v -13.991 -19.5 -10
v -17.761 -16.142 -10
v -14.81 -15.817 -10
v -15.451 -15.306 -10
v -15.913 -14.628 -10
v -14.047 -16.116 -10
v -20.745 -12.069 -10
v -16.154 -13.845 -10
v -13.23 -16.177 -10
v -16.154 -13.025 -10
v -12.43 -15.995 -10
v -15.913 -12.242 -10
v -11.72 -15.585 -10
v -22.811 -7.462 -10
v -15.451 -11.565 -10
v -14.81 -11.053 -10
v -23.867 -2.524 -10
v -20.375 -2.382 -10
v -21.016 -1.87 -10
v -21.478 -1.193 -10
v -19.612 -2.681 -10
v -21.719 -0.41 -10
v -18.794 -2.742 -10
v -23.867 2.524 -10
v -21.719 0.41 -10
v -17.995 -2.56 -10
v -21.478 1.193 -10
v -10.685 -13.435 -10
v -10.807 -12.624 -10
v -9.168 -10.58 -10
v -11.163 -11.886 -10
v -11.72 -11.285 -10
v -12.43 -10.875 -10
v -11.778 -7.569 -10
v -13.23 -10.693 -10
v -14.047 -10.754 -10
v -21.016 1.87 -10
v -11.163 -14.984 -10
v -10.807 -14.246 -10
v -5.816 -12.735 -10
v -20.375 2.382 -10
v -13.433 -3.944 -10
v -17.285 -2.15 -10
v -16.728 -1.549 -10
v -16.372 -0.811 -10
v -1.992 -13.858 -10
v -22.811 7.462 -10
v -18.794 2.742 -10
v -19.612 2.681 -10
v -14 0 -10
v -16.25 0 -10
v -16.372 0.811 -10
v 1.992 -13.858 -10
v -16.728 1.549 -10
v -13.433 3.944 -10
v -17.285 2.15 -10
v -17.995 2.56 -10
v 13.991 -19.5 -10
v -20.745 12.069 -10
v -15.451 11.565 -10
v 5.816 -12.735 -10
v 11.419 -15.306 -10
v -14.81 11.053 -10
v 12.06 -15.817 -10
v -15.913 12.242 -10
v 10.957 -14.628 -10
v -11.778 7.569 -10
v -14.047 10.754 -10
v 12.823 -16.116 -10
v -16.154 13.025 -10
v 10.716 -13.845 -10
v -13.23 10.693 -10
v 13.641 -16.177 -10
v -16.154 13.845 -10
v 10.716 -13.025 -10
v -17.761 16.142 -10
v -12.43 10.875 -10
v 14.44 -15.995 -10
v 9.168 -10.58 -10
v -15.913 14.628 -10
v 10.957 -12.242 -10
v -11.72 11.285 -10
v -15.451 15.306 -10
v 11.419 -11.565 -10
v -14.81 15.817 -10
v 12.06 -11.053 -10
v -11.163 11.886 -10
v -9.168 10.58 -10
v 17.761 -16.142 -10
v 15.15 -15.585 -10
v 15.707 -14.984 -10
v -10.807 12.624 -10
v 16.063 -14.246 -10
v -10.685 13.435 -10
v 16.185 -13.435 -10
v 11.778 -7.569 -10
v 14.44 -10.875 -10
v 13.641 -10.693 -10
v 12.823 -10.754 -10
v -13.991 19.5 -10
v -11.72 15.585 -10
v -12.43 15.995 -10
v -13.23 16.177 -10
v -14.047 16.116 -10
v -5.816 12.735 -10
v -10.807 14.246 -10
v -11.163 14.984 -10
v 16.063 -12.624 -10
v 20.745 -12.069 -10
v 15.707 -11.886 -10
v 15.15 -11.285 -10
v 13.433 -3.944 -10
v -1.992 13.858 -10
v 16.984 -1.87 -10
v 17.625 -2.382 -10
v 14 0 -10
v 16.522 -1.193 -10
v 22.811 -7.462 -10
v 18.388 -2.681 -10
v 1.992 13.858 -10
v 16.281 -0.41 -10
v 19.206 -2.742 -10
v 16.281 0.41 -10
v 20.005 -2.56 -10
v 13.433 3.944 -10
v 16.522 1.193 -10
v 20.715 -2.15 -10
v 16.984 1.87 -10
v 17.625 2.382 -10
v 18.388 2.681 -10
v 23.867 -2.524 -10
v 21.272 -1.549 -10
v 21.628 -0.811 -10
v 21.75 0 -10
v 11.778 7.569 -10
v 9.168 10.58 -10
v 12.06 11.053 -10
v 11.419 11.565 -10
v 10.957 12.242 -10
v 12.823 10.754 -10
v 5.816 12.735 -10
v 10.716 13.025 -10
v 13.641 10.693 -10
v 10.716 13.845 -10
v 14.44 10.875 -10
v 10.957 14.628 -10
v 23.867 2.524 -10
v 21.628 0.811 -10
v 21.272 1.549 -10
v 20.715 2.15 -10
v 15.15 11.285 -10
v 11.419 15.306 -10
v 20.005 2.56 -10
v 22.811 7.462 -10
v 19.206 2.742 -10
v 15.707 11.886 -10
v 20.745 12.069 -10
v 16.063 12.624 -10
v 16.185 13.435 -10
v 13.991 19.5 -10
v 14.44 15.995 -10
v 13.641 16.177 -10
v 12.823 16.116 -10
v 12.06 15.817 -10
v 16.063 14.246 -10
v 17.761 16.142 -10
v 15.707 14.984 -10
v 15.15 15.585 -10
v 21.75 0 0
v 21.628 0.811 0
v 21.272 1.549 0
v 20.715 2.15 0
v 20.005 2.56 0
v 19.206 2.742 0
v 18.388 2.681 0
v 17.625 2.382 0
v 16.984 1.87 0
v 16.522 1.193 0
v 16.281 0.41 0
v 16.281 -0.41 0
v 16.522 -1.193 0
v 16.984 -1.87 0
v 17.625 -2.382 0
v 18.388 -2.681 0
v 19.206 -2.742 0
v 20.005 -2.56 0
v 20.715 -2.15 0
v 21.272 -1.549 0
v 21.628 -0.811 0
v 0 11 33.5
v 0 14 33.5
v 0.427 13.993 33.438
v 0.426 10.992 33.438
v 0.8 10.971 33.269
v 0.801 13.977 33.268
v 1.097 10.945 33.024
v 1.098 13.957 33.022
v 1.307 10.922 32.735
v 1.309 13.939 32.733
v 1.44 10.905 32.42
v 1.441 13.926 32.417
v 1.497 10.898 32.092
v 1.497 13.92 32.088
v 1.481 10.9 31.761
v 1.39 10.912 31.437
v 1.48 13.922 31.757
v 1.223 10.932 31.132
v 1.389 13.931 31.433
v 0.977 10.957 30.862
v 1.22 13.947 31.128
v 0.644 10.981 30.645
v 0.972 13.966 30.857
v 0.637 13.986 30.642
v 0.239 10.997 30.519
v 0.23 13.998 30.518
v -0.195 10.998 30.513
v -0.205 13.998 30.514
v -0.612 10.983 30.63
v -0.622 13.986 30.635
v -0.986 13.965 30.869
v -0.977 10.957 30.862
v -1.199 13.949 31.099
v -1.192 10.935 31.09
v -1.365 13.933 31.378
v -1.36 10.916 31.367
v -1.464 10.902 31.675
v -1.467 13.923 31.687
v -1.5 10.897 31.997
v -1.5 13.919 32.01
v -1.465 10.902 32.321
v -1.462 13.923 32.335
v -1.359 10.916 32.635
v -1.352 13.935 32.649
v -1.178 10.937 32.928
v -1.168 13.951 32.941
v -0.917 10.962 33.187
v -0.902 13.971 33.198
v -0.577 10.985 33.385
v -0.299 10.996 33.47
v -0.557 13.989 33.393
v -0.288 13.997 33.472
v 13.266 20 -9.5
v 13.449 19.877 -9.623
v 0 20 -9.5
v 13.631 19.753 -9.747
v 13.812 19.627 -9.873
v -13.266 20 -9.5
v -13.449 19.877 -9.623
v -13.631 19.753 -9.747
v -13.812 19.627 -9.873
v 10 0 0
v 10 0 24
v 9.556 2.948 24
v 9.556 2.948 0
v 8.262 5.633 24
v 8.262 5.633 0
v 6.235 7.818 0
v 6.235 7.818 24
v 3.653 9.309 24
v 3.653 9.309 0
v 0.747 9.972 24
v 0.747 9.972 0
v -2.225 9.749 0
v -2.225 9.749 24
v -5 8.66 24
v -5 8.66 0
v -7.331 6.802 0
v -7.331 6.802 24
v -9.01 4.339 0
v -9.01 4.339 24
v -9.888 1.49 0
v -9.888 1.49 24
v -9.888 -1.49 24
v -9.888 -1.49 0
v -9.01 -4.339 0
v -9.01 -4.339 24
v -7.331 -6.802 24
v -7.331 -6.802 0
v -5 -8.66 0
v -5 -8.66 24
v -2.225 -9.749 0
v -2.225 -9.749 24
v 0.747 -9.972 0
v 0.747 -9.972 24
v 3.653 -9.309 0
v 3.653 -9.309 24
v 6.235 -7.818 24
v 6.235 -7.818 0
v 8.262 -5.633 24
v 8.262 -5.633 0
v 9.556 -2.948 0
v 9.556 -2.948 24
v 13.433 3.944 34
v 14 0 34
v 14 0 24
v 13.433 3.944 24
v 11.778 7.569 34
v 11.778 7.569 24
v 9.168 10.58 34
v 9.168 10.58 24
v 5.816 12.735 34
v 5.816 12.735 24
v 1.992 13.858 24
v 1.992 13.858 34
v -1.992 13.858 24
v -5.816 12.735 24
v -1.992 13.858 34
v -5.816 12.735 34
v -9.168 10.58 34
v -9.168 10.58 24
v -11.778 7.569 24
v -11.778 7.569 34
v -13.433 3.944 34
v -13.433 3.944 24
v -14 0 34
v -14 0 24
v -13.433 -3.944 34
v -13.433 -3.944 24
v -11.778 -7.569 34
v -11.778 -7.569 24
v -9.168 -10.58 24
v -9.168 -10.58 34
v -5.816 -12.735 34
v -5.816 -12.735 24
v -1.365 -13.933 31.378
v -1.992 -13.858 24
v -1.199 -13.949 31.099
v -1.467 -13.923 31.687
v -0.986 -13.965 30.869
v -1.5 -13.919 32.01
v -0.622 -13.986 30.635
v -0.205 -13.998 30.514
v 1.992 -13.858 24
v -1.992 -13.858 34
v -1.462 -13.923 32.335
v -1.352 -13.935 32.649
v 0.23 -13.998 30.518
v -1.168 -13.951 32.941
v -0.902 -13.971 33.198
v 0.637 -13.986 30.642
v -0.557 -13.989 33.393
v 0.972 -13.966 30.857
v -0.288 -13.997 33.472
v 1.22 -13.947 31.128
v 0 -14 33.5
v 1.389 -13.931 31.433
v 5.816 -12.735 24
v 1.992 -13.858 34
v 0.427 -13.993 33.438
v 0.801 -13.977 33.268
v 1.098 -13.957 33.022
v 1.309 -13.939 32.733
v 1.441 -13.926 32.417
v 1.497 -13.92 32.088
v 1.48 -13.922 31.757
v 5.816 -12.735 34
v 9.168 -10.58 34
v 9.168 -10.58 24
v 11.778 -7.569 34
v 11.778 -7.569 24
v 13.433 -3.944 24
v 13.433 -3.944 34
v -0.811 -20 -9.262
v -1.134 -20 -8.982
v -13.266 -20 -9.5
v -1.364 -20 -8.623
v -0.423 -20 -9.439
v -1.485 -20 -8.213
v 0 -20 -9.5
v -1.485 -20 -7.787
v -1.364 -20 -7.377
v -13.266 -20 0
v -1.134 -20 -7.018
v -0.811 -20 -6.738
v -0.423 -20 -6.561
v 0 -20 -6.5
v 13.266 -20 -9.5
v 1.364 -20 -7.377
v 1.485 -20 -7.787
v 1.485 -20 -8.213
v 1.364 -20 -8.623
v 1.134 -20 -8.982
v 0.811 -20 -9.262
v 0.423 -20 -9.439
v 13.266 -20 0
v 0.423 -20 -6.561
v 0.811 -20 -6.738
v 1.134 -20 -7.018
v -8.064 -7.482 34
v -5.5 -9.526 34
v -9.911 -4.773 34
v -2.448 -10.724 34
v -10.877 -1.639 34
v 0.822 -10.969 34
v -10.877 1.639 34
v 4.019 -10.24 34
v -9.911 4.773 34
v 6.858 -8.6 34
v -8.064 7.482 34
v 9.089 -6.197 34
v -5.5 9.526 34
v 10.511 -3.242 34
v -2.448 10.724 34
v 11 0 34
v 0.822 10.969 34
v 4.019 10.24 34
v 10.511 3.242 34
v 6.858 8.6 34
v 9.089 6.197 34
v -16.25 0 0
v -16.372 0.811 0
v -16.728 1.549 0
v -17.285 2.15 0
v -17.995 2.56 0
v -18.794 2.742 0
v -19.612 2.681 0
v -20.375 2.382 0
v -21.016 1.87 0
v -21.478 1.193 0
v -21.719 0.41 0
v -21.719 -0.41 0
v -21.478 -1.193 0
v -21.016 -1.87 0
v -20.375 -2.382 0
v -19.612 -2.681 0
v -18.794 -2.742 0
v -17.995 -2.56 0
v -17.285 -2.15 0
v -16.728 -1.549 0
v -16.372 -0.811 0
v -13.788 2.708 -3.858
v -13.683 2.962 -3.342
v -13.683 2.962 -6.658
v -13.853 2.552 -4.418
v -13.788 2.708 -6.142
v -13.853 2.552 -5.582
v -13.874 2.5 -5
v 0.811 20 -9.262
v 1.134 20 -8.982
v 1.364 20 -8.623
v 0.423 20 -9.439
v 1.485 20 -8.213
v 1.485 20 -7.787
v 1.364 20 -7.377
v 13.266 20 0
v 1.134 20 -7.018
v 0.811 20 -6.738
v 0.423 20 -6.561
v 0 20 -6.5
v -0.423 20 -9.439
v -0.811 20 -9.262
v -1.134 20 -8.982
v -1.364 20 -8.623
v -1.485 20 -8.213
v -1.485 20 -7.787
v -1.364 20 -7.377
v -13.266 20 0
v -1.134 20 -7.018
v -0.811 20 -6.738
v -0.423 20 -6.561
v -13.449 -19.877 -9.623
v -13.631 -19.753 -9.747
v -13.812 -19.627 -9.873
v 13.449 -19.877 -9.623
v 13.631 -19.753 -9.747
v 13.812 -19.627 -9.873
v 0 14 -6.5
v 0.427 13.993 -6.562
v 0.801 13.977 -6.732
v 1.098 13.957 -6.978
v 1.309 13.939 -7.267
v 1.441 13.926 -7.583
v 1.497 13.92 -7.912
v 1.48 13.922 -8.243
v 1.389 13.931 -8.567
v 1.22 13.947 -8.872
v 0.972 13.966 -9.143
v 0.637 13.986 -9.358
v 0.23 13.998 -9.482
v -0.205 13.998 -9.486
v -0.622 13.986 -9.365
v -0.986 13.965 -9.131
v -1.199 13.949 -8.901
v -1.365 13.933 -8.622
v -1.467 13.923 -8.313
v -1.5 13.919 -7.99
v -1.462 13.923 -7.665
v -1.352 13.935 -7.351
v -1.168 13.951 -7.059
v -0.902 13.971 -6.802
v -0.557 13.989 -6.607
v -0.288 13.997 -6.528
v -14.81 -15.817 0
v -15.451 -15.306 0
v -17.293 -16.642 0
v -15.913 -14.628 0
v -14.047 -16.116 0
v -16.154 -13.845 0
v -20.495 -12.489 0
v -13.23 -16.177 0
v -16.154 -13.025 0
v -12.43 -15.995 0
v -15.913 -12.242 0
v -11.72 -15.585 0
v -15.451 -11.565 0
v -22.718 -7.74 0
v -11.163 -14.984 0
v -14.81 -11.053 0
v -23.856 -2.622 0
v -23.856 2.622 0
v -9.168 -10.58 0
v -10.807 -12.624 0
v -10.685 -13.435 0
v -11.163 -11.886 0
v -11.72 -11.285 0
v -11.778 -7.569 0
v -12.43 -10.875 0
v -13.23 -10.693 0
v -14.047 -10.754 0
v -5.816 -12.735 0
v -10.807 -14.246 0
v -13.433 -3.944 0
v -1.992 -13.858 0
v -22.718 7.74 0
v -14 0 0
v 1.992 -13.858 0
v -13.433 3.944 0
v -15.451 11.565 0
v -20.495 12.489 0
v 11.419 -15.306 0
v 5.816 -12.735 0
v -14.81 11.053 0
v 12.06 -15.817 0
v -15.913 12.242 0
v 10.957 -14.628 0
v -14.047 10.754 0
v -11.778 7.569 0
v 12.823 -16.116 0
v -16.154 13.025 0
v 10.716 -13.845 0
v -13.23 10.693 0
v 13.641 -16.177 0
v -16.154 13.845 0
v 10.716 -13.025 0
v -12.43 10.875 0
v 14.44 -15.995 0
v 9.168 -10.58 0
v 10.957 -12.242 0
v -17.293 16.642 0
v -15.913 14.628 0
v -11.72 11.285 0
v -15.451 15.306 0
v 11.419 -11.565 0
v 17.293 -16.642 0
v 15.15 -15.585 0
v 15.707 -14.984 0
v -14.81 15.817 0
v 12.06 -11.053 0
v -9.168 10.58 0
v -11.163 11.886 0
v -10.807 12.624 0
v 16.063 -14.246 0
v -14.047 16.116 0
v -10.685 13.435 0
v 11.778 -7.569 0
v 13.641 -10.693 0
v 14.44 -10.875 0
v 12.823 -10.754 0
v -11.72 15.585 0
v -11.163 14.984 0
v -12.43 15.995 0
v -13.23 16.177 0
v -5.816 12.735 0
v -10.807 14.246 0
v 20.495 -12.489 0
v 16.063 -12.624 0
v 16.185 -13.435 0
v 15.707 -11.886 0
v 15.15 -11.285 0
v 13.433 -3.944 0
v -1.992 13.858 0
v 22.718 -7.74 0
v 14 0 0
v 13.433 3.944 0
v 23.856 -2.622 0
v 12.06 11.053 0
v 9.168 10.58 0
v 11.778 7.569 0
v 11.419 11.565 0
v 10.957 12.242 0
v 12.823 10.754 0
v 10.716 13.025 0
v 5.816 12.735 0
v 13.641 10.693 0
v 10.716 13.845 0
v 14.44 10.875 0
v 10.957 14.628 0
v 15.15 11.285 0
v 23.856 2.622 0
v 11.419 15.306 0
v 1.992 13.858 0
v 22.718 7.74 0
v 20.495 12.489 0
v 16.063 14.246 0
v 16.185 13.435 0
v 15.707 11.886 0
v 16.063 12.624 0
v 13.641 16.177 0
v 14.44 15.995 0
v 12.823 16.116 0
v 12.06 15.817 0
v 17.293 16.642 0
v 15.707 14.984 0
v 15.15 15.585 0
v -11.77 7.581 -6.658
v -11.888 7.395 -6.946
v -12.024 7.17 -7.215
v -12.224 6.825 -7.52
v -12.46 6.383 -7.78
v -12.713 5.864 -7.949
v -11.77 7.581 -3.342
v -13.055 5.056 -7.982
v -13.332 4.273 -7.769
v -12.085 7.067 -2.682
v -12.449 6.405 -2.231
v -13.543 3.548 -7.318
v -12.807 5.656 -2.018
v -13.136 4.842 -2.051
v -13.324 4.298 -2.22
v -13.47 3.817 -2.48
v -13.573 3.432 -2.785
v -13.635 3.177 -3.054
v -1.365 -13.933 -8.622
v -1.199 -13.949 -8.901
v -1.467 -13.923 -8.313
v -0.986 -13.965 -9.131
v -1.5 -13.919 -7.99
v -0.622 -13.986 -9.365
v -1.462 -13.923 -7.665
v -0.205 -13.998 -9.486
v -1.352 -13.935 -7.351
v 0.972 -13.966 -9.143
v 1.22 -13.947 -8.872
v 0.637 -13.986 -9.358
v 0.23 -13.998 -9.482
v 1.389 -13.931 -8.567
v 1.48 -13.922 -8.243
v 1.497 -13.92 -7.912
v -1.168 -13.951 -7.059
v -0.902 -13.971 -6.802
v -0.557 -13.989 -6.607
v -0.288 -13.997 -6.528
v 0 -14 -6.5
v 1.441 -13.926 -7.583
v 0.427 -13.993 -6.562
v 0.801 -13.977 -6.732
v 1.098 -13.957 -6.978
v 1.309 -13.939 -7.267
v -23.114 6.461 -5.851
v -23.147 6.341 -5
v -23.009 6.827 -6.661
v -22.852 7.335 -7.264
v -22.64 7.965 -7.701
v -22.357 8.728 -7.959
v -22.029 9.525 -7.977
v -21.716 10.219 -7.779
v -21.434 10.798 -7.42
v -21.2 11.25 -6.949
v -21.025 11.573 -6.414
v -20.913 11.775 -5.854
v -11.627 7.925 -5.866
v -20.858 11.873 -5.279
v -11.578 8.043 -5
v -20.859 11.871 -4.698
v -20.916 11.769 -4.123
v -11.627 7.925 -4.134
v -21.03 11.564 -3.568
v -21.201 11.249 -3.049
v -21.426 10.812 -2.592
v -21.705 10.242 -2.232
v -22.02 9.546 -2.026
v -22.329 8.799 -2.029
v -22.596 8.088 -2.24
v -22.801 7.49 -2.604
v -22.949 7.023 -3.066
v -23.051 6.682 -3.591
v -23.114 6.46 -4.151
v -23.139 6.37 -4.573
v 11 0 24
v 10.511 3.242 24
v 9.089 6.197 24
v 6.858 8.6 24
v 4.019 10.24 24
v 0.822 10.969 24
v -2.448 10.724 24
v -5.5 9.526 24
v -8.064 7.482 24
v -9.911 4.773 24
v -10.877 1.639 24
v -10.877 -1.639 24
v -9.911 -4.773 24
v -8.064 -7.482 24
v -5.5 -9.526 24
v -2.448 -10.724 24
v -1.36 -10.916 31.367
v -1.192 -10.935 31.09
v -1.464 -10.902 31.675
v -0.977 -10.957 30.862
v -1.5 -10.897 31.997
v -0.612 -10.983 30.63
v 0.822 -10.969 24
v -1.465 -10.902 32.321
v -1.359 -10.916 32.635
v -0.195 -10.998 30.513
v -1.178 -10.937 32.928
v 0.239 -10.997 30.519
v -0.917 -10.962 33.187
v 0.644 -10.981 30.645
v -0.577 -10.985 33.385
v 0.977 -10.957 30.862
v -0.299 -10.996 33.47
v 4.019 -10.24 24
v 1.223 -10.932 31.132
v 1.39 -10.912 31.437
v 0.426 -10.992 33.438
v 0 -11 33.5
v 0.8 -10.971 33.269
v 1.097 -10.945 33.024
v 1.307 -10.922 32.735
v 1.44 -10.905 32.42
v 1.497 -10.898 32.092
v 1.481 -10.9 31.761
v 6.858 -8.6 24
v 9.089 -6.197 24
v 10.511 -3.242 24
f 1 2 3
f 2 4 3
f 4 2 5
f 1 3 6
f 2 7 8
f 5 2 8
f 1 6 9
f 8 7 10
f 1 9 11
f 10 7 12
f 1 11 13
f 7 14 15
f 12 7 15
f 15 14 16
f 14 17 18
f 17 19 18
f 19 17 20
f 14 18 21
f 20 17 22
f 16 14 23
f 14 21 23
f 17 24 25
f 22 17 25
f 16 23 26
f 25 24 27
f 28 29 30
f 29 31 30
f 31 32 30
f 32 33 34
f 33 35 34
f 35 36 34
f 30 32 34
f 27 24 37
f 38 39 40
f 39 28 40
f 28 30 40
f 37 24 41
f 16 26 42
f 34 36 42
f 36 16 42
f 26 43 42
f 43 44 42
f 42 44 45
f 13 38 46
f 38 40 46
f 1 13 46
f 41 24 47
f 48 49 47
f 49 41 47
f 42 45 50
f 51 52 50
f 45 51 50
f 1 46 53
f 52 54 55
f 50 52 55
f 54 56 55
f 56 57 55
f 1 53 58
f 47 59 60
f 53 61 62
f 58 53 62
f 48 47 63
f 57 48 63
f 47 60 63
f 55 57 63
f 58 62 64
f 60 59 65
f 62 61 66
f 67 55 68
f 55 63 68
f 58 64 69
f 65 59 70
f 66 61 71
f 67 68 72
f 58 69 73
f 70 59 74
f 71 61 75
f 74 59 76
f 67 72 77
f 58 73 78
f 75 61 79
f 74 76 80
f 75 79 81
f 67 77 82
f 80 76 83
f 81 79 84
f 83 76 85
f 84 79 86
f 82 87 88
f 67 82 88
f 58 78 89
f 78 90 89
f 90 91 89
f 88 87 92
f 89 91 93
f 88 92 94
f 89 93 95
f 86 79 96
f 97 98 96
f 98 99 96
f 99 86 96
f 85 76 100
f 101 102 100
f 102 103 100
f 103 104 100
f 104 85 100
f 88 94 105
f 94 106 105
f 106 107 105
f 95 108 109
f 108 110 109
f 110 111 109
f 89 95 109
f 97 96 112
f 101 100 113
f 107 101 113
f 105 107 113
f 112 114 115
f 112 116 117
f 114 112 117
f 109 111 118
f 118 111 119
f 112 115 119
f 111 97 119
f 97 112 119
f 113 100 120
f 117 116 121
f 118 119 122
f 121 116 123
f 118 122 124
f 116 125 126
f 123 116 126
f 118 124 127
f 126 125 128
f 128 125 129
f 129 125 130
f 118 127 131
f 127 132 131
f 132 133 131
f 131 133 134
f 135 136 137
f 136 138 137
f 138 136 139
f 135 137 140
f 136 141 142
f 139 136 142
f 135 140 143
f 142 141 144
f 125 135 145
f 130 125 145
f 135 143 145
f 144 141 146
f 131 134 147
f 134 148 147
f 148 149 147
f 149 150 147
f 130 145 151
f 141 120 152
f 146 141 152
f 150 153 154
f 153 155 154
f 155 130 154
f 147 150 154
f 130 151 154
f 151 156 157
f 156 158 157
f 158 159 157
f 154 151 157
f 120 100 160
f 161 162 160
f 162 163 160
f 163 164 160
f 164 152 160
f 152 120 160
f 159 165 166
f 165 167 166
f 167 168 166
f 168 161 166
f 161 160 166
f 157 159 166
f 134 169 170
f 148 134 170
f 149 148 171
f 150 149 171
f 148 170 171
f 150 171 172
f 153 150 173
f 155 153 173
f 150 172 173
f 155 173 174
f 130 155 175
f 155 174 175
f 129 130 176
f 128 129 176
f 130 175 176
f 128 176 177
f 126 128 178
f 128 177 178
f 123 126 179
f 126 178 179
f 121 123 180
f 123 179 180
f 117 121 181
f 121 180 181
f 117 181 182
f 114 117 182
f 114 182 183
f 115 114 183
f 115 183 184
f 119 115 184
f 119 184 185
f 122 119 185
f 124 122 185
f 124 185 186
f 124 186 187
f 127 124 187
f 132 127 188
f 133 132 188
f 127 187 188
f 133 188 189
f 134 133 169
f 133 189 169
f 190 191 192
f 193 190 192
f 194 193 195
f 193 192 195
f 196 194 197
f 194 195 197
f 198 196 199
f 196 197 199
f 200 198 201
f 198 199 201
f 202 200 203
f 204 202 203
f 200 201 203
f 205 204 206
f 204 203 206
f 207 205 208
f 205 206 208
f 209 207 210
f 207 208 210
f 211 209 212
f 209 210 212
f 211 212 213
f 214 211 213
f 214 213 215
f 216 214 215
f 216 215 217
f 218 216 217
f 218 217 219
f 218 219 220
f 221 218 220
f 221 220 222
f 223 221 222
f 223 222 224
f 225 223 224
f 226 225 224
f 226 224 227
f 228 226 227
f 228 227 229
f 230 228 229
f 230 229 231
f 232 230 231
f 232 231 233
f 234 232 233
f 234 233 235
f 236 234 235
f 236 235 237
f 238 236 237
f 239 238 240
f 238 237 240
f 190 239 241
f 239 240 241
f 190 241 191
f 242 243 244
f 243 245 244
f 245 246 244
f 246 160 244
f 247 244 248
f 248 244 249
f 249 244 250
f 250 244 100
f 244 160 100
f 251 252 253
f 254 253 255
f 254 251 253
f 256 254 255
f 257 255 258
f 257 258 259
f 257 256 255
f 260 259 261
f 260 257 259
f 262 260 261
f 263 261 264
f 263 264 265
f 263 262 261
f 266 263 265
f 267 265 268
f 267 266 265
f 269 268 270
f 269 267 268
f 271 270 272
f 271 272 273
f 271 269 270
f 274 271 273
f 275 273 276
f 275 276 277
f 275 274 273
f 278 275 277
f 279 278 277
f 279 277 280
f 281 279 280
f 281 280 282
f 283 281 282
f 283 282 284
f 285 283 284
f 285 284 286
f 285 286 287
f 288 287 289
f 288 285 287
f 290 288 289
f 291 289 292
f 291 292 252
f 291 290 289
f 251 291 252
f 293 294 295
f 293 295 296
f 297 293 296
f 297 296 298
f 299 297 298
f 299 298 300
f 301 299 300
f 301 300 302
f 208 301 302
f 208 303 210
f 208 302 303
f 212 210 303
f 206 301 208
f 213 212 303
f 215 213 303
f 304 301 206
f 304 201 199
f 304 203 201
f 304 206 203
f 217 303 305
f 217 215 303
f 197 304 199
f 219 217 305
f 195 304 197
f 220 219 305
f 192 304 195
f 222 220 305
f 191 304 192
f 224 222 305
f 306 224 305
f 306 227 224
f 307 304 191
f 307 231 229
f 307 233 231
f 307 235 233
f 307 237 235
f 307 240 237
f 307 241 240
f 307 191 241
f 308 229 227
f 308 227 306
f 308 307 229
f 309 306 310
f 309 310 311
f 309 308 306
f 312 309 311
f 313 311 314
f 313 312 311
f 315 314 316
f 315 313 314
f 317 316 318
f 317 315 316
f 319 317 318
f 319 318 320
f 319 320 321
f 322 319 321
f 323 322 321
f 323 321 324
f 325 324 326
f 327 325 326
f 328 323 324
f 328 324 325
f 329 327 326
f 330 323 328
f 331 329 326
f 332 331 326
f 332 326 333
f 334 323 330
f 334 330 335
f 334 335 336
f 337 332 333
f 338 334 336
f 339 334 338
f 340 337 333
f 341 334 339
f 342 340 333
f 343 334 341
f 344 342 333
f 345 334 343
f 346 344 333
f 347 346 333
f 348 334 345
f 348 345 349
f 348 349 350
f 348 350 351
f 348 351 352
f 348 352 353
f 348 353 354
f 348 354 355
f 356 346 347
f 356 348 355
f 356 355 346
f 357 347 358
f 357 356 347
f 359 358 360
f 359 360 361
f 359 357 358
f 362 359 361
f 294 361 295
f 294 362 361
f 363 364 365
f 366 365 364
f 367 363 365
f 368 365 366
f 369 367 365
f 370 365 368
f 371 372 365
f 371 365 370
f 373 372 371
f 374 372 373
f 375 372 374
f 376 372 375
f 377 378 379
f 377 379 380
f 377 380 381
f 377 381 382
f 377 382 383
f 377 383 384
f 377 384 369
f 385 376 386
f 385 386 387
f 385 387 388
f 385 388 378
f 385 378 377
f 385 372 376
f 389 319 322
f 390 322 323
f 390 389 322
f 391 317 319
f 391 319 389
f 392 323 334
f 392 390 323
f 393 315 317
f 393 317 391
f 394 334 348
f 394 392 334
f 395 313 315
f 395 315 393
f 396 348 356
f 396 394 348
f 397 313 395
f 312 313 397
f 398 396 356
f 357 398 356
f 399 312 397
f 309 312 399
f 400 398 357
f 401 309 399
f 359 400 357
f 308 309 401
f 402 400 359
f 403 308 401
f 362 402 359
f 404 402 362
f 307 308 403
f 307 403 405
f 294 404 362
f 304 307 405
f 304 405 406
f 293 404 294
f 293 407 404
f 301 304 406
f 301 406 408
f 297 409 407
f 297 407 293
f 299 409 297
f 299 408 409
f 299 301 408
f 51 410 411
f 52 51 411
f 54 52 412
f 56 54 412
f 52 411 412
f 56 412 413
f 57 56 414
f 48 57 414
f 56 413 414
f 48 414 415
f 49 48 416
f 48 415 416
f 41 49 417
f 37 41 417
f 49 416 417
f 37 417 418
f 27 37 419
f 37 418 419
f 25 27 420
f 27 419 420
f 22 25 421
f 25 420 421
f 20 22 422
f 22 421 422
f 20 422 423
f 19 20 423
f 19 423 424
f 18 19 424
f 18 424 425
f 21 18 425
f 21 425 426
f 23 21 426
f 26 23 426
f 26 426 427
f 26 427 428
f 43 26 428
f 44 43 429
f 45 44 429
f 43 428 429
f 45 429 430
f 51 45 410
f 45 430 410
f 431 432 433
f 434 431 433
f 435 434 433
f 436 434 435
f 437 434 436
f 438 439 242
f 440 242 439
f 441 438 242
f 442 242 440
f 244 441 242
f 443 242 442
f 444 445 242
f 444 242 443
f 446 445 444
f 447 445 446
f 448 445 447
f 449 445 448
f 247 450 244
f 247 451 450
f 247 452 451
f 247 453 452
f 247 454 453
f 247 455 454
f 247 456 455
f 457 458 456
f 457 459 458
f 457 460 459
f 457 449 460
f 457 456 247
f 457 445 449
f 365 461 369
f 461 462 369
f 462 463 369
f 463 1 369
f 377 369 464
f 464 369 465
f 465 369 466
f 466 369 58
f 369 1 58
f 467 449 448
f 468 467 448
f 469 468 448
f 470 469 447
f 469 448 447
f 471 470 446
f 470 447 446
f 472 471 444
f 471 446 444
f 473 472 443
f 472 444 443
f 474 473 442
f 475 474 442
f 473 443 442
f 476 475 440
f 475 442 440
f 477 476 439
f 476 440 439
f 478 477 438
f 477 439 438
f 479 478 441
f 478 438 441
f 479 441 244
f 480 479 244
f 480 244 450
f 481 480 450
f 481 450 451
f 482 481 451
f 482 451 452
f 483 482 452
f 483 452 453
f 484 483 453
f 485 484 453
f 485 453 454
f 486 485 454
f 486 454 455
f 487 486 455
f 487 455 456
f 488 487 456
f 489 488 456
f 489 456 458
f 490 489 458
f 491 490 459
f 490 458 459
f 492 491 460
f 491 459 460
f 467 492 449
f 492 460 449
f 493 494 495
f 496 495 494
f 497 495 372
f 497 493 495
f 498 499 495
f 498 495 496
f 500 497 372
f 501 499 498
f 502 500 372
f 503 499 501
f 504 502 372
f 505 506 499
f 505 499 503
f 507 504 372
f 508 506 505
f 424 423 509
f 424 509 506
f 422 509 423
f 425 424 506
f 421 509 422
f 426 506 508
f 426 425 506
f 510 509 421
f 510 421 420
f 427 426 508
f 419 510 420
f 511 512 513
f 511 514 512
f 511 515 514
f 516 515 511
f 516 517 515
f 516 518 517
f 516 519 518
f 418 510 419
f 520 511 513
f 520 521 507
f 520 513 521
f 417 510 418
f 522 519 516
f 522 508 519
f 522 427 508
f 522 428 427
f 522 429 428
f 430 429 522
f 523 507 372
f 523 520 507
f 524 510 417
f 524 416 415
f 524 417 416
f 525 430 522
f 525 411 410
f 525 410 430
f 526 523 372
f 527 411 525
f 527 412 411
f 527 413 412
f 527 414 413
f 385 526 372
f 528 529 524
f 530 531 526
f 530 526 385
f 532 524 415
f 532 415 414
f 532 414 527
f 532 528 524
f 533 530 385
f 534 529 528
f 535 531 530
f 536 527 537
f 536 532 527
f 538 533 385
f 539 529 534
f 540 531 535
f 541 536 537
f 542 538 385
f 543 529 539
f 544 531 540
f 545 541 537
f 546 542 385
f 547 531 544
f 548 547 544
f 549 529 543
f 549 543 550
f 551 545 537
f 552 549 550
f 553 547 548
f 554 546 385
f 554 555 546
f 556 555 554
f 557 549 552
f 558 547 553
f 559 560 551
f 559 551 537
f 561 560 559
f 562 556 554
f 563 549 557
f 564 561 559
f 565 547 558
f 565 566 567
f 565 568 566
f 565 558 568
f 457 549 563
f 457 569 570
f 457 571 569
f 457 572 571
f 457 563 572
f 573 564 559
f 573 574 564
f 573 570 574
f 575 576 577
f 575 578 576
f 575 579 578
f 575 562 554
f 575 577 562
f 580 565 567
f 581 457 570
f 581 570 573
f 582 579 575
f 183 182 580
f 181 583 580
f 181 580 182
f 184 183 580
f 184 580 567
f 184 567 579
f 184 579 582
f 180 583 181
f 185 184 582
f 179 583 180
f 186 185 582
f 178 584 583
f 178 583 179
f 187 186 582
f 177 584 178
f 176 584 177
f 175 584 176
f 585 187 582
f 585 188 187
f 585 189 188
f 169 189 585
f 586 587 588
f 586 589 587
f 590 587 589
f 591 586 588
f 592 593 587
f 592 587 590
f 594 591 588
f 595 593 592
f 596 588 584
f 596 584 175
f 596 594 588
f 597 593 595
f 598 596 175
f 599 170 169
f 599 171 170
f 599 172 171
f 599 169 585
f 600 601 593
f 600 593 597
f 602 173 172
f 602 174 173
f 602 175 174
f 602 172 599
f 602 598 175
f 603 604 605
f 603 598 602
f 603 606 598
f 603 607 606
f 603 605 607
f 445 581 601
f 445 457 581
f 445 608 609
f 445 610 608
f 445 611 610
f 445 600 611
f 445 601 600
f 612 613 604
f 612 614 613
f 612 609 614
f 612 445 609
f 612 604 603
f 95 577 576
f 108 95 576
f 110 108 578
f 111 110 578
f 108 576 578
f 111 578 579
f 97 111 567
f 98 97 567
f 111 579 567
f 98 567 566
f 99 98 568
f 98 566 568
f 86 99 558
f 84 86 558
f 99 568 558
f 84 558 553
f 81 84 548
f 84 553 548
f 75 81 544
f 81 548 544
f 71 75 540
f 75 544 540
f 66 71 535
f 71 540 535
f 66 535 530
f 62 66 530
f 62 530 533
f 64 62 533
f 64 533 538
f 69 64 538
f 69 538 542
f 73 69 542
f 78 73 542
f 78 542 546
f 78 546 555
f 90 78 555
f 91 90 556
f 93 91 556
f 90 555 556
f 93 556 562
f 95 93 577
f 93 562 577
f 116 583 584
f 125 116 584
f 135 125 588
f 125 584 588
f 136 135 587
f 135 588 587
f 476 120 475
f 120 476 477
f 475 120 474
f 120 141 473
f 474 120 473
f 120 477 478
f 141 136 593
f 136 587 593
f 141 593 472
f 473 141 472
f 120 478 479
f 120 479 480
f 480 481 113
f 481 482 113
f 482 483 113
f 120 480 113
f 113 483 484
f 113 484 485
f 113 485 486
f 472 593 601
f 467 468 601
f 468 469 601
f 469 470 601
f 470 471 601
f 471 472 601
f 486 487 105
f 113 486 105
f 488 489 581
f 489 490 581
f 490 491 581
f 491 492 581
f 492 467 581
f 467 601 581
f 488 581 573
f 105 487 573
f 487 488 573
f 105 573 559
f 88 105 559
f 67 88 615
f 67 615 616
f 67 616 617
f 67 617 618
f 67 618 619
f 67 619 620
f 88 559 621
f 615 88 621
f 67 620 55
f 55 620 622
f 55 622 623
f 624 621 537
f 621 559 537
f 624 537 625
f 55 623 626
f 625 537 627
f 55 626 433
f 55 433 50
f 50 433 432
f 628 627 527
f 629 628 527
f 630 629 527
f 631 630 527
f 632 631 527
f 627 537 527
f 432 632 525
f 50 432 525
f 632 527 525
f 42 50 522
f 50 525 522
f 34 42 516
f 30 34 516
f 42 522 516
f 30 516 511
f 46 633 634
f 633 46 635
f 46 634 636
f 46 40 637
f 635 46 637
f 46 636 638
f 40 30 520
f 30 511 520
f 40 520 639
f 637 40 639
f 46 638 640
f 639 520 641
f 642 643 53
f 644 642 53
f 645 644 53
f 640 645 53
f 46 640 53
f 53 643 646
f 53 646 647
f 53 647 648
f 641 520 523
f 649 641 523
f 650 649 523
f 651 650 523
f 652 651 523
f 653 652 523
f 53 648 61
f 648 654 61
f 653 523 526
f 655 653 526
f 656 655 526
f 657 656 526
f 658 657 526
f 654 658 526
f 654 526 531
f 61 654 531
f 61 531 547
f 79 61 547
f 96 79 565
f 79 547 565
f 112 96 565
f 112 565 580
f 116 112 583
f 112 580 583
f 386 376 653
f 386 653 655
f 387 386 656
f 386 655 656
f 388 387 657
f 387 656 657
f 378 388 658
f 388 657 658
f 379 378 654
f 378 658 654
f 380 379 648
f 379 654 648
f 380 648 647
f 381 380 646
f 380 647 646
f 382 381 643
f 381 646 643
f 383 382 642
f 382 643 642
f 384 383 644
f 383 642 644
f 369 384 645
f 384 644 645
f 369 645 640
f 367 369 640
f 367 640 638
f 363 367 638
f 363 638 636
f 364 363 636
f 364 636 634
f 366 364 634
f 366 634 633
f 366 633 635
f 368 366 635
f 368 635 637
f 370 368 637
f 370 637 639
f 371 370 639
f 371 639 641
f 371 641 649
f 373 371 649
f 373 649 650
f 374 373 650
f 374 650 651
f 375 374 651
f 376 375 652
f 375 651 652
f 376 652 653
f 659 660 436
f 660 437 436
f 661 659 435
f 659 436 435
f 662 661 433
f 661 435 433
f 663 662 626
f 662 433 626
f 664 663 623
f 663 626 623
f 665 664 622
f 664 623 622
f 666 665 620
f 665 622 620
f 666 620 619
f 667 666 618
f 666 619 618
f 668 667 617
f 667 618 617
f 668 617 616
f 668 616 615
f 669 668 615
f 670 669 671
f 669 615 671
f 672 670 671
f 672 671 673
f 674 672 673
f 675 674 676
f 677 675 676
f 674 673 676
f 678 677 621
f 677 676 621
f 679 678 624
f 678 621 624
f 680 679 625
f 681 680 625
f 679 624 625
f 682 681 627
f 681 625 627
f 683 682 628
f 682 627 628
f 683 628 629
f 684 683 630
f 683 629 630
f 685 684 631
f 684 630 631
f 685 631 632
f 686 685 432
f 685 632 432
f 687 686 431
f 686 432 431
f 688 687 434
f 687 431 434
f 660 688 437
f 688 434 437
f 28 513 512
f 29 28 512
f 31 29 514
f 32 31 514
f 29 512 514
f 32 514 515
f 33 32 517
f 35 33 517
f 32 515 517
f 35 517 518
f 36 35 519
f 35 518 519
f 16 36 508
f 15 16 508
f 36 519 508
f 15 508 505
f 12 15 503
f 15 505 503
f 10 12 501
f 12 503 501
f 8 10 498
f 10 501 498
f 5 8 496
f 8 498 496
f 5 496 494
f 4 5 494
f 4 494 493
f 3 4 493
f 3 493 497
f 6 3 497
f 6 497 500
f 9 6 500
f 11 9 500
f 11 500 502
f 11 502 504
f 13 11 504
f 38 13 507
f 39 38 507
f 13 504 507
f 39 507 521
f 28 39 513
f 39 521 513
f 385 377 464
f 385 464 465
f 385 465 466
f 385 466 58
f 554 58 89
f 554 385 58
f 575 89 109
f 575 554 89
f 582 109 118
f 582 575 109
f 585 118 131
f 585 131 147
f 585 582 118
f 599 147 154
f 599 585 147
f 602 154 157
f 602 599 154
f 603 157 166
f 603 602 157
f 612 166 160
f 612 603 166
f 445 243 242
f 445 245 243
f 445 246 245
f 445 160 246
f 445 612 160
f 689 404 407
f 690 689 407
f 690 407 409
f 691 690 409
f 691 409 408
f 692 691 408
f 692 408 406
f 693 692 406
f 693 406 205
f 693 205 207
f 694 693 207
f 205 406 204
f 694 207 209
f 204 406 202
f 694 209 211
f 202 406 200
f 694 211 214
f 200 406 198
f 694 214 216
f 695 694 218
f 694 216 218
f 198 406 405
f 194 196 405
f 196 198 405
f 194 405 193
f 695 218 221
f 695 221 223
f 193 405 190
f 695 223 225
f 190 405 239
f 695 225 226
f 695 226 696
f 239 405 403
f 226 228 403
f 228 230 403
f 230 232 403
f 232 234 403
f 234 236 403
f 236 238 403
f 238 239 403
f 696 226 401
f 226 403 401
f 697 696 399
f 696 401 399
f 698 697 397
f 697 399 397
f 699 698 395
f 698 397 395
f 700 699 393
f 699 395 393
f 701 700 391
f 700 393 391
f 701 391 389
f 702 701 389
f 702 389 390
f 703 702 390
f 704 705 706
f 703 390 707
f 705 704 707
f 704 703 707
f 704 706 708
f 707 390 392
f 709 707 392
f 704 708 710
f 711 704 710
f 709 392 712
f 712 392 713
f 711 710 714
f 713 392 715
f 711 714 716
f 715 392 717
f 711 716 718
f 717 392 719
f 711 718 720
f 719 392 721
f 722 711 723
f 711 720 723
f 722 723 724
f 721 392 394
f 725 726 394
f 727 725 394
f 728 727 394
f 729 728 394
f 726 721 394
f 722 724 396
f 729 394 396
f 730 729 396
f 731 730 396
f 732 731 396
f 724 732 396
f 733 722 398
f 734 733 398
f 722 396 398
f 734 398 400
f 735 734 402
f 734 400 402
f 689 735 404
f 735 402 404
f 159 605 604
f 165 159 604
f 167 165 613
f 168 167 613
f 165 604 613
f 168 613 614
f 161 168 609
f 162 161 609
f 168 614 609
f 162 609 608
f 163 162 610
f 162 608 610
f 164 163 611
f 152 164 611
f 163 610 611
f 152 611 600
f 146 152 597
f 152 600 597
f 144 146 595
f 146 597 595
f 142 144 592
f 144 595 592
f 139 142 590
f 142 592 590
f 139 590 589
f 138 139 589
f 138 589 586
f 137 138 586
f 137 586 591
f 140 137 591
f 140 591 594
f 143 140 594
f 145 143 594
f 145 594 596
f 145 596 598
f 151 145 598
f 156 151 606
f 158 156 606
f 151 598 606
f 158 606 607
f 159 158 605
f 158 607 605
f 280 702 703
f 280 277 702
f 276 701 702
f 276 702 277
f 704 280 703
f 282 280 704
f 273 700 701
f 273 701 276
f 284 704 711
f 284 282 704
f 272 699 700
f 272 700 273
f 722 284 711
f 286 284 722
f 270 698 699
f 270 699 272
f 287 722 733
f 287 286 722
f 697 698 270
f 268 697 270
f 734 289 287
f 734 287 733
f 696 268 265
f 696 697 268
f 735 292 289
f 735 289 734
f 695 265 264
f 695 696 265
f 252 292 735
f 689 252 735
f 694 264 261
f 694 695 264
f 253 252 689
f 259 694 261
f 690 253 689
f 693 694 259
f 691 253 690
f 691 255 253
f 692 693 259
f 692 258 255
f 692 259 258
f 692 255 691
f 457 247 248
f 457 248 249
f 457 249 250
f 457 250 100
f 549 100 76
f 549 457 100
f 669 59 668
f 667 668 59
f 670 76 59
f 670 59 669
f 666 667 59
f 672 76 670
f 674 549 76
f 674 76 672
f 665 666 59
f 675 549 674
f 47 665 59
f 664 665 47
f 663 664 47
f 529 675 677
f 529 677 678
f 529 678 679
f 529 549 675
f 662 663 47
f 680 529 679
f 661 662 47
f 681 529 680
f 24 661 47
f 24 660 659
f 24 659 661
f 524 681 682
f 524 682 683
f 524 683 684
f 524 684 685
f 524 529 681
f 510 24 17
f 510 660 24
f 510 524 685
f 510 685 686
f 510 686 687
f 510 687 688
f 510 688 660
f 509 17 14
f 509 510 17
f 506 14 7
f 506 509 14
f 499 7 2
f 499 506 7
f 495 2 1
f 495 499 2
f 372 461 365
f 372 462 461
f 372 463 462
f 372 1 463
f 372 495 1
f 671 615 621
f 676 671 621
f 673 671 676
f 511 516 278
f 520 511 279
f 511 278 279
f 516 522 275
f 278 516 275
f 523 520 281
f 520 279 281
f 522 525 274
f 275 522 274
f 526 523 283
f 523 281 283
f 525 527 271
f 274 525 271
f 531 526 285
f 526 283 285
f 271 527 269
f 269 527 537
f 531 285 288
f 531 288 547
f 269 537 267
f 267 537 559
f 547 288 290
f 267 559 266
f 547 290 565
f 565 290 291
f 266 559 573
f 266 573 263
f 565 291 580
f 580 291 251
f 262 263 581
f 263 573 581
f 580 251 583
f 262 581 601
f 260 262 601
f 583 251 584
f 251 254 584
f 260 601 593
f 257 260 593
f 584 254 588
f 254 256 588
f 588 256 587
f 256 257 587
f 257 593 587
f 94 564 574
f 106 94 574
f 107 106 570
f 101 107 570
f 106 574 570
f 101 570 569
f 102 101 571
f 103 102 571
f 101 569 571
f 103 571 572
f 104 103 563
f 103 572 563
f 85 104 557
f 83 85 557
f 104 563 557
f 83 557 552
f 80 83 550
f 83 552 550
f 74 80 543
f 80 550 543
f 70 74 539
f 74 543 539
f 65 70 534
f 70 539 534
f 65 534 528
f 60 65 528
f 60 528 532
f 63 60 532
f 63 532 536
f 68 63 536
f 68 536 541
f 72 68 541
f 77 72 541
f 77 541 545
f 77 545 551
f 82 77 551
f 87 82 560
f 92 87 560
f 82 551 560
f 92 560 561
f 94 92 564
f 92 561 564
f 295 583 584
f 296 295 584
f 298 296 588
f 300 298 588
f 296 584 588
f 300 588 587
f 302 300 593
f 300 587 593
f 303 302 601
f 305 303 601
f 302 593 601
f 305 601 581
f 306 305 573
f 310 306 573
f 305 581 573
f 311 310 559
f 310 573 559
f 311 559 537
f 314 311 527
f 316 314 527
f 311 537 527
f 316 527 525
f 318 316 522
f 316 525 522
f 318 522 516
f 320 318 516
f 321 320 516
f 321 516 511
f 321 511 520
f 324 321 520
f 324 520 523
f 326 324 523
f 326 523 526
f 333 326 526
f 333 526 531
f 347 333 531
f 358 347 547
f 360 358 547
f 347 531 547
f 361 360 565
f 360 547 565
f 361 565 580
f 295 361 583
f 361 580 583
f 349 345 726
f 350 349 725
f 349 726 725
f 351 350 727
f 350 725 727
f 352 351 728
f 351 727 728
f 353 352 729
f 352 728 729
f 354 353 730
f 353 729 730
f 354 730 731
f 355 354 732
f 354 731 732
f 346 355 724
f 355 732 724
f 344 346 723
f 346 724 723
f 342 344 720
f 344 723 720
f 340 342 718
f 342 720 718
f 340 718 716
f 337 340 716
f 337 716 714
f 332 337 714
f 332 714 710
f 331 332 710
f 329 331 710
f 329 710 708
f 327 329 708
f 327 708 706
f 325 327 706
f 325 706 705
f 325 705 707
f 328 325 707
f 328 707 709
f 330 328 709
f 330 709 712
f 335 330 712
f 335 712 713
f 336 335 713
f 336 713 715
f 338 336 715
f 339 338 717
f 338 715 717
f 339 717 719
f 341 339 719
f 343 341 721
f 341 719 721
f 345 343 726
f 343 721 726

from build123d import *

# Parameters (mm, degrees)
SKETCH1_R           = 2.75
SKETCH1_R_2         = 14
BOSS_EXTRUDE1_DEPTH = 10
SKETCH1_3_R         = 14
SKETCH1_3_R_2       = 11
SKETCH1_3_R_3       = 10
BOSS_EXTRUDE2_DEPTH = 24
BOSS_EXTRUDE3_START = 10
SKETCH3_R           = 14
SKETCH3_R_2         = 11
BOSS_EXTRUDE3_DEPTH = 10
CHAMFER1_SIZE       = 0.5
SKETCH4_R           = 1.5
CUT_EXTRUDE1_DEPTH  = 58.723478759


with BuildPart() as part:
    # Sketch1 → Boss-Extrude1 (new body)
    with BuildSketch(Plane.XY):
        with BuildLine():
            Line((-13.266499161, -20), (13.266499161, -20))
            ThreePointArc((13.266499161, -20), (24, 0), (13.266499161, 20))
            Line((13.266499161, 20), (-13.266499161, 20))
            ThreePointArc((-13.266499161, 20), (-24, 0), (-13.266499161, -20))
        make_face()
        with Locations((-19, 0)):
            Circle(SKETCH1_R, mode=Mode.SUBTRACT)
        with Locations((13.435028843, 13.435028843)):
            Circle(SKETCH1_R, mode=Mode.SUBTRACT)
        with Locations((13.435028843, -13.435028843)):
            Circle(SKETCH1_R, mode=Mode.SUBTRACT)
        with Locations((19, 0)):
            Circle(SKETCH1_R, mode=Mode.SUBTRACT)
        Circle(SKETCH1_R_2, mode=Mode.SUBTRACT)
        with Locations((-13.435028843, -13.435028843)):
            Circle(SKETCH1_R, mode=Mode.SUBTRACT)
        with Locations((-13.435028843, 13.435028843)):
            Circle(SKETCH1_R, mode=Mode.SUBTRACT)
    extrude(amount=-BOSS_EXTRUDE1_DEPTH)

    # Chamfer1
    chamfer1_edges = [part.edges().sort_by_distance(p)[0] for p in [
        (0, -20, -10),
        (0, 20, -10),
    ]]
    chamfer(chamfer1_edges, length=CHAMFER1_SIZE)


with BuildPart() as body_2:
    # Sketch1<3> → Boss-Extrude2 (new body)
    # profile 1 of 2: a face of its own
    with BuildSketch(Plane.XY):
        Circle(SKETCH1_3_R)
        Circle(SKETCH1_3_R_2, mode=Mode.SUBTRACT)
    # profile 2 of 2: a face of its own
    with BuildSketch(Plane.XY):
        Circle(SKETCH1_3_R_2)
        Circle(SKETCH1_3_R_3, mode=Mode.SUBTRACT)
    extrude(amount=BOSS_EXTRUDE2_DEPTH)

    # Sketch3 → Boss-Extrude3 (add)
    with BuildSketch(Plane.XY.offset(24).offset(BOSS_EXTRUDE3_START)):
        Circle(SKETCH3_R)
        Circle(SKETCH3_R_2, mode=Mode.SUBTRACT)
    extrude(amount=-BOSS_EXTRUDE3_DEPTH)


with BuildPart() as cut_extrude1_tool:
    # Sketch4 → Cut-Extrude1 (new, through all)
    with BuildSketch(Plane(origin=(0, 20, 0), x_dir=(1, 0, 0), z_dir=(0, 1, 0))):
        with Locations(Location((0, 8, 0), (0, 0, 270))):
            Circle(SKETCH4_R)
        with Locations(Location((0, -32, 0), (0, 0, 270))):
            Circle(SKETCH4_R)
    extrude(amount=-CUT_EXTRUDE1_DEPTH)


with BuildPart() as part_1:
    add(part.part)

    # Cut-Extrude1: cut by cut_extrude1_tool
    add(cut_extrude1_tool.part, mode=Mode.SUBTRACT)

    # Sketch7 → Cut-Revolve3 (revolve, cut)
    with BuildSketch(Plane.XY.offset(-5), mode=Mode.PRIVATE) as cut_revolve3_sk:
        with BuildLine():
            Line((-11.578369304, 8.043094197), (-11.76971102, 7.581154431))
            Line((-11.76971102, 7.581154431), (-7.689730302, 5.891171083))
            Line((-7.689730302, 5.891171083), (-8.646438883, 3.581472252))
            Line((-8.646438883, 3.581472252), (-23.73783256, 9.832532188))
            ThreePointArc((-23.73783256, 9.832532188), (-23.122197536, 11.203899543), (-22.427418184, 12.536917382))
            Line((-22.427418184, 12.536917382), (-11.578369304, 8.043094197))
        make_face()
    revolve(cut_revolve3_sk.sketch.rotate(Axis((-23.73783256, 9.832532188, -5), (0.9238795325112868, -0.38268343236508984, 0)), 180), axis=Axis((-23.73783256, 9.832532188, -5), (0.9238795325112868, -0.38268343236508984, 0)), mode=Mode.SUBTRACT)


with BuildPart() as body_2_1:
    add(body_2.part)

    # Cut-Extrude1: cut by cut_extrude1_tool
    add(cut_extrude1_tool.part, mode=Mode.SUBTRACT)


solid = Compound([part_1.part, body_2_1.part])
